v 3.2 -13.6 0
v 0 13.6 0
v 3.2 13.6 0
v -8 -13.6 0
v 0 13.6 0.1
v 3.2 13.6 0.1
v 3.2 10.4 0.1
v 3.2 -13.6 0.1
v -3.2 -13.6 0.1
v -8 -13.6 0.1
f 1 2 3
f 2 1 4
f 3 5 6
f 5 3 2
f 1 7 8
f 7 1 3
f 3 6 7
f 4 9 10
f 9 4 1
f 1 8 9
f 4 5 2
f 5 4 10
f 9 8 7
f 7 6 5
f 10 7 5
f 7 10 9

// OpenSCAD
use <../lib.scad>
function ldraw_lib__6153754a() = [
// 0 Sticker  3.4 x  1.4 with Dark Azure Volkswagen Left Front Window Pillar
// 0 Name: 6153754a.dat
// 0 Author: Magnus Forsberg [MagFors]
// 0 !LDRAW_ORG Part UPDATE 2016-01
// 0 !LICENSE Licensed under CC BY 4.0 : see CAreadme.txt
// 
// 0 BFC CERTIFY CCW
  [0,"BFC","CERTIFY"],
  [0,"BFC","CCW"],
// 
// 0 !KEYWORDS Beetle, set 10252, VW
// 
// 0 !HISTORY 2016-12-31 [PTadmin] Official Update 2016-01
// 
// 
// 4 16 0 0 34 8 0 34 8 0 -34 -20 0 -34
  [4,16,0,0,34,8,0,34,8,0,-34,-20,0,-34],
// 4 16 0 -0.25 34 8 -0.25 34 8 0 34 0 0 34
  [4,16,0,-0.25,34,8,-0.25,34,8,0,34,0,0,34],
// 4 16 8 -.25 26 8 -.25 -34 8 0 -34 8 0 34
  [4,16,8,-.25,26,8,-.25,-34,8,0,-34,8,0,34],
// 3 16 8 0 34 8 -.25 34 8 -.25 26
  [3,16,8,0,34,8,-.25,34,8,-.25,26],
// 4 16 -8 -.25 -34 -20 -.25 -34 -20 0 -34 8 0 -34
  [4,16,-8,-.25,-34,-20,-.25,-34,-20,0,-34,8,0,-34],
// 3 16 8 0 -34 8 -.25 -34 -8 -.25 -34
  [3,16,8,0,-34,8,-.25,-34,-8,-.25,-34],
// 4 16 -20 -0.25 -34 0 -0.25 34 0 0 34 -20 0 -34
  [4,16,-20,-0.25,-34,0,-0.25,34,0,0,34,-20,0,-34],
// 3 16 -8 -.25 -34 8 -.25 -34 8 -.25 26
  [3,16,-8,-.25,-34,8,-.25,-34,8,-.25,26],
// 0 BFC NOCLIP
  [0,"BFC","NOCLIP"],
// 3 321 8 -.25 26 8 -.25 34 0 -.25 34
  [3,321,8,-.25,26,8,-.25,34,0,-.25,34],
// 4 321 -20 -.25 -34 -8 -.25 -34 8 -.25 26 0 -.25 34
  [4,321,-20,-.25,-34,-8,-.25,-34,8,-.25,26,0,-.25,34],
];
module ldraw_lib__6153754a(step=0, col=false, unit=2/5, alt=false, line=0.2, solid=!$preview)
    makepoly(ldraw_lib__6153754a(), step=step, col=col, unit=unit, alt=alt, line=line, solid=solid);
ldraw_lib__6153754a(line=0.2);
